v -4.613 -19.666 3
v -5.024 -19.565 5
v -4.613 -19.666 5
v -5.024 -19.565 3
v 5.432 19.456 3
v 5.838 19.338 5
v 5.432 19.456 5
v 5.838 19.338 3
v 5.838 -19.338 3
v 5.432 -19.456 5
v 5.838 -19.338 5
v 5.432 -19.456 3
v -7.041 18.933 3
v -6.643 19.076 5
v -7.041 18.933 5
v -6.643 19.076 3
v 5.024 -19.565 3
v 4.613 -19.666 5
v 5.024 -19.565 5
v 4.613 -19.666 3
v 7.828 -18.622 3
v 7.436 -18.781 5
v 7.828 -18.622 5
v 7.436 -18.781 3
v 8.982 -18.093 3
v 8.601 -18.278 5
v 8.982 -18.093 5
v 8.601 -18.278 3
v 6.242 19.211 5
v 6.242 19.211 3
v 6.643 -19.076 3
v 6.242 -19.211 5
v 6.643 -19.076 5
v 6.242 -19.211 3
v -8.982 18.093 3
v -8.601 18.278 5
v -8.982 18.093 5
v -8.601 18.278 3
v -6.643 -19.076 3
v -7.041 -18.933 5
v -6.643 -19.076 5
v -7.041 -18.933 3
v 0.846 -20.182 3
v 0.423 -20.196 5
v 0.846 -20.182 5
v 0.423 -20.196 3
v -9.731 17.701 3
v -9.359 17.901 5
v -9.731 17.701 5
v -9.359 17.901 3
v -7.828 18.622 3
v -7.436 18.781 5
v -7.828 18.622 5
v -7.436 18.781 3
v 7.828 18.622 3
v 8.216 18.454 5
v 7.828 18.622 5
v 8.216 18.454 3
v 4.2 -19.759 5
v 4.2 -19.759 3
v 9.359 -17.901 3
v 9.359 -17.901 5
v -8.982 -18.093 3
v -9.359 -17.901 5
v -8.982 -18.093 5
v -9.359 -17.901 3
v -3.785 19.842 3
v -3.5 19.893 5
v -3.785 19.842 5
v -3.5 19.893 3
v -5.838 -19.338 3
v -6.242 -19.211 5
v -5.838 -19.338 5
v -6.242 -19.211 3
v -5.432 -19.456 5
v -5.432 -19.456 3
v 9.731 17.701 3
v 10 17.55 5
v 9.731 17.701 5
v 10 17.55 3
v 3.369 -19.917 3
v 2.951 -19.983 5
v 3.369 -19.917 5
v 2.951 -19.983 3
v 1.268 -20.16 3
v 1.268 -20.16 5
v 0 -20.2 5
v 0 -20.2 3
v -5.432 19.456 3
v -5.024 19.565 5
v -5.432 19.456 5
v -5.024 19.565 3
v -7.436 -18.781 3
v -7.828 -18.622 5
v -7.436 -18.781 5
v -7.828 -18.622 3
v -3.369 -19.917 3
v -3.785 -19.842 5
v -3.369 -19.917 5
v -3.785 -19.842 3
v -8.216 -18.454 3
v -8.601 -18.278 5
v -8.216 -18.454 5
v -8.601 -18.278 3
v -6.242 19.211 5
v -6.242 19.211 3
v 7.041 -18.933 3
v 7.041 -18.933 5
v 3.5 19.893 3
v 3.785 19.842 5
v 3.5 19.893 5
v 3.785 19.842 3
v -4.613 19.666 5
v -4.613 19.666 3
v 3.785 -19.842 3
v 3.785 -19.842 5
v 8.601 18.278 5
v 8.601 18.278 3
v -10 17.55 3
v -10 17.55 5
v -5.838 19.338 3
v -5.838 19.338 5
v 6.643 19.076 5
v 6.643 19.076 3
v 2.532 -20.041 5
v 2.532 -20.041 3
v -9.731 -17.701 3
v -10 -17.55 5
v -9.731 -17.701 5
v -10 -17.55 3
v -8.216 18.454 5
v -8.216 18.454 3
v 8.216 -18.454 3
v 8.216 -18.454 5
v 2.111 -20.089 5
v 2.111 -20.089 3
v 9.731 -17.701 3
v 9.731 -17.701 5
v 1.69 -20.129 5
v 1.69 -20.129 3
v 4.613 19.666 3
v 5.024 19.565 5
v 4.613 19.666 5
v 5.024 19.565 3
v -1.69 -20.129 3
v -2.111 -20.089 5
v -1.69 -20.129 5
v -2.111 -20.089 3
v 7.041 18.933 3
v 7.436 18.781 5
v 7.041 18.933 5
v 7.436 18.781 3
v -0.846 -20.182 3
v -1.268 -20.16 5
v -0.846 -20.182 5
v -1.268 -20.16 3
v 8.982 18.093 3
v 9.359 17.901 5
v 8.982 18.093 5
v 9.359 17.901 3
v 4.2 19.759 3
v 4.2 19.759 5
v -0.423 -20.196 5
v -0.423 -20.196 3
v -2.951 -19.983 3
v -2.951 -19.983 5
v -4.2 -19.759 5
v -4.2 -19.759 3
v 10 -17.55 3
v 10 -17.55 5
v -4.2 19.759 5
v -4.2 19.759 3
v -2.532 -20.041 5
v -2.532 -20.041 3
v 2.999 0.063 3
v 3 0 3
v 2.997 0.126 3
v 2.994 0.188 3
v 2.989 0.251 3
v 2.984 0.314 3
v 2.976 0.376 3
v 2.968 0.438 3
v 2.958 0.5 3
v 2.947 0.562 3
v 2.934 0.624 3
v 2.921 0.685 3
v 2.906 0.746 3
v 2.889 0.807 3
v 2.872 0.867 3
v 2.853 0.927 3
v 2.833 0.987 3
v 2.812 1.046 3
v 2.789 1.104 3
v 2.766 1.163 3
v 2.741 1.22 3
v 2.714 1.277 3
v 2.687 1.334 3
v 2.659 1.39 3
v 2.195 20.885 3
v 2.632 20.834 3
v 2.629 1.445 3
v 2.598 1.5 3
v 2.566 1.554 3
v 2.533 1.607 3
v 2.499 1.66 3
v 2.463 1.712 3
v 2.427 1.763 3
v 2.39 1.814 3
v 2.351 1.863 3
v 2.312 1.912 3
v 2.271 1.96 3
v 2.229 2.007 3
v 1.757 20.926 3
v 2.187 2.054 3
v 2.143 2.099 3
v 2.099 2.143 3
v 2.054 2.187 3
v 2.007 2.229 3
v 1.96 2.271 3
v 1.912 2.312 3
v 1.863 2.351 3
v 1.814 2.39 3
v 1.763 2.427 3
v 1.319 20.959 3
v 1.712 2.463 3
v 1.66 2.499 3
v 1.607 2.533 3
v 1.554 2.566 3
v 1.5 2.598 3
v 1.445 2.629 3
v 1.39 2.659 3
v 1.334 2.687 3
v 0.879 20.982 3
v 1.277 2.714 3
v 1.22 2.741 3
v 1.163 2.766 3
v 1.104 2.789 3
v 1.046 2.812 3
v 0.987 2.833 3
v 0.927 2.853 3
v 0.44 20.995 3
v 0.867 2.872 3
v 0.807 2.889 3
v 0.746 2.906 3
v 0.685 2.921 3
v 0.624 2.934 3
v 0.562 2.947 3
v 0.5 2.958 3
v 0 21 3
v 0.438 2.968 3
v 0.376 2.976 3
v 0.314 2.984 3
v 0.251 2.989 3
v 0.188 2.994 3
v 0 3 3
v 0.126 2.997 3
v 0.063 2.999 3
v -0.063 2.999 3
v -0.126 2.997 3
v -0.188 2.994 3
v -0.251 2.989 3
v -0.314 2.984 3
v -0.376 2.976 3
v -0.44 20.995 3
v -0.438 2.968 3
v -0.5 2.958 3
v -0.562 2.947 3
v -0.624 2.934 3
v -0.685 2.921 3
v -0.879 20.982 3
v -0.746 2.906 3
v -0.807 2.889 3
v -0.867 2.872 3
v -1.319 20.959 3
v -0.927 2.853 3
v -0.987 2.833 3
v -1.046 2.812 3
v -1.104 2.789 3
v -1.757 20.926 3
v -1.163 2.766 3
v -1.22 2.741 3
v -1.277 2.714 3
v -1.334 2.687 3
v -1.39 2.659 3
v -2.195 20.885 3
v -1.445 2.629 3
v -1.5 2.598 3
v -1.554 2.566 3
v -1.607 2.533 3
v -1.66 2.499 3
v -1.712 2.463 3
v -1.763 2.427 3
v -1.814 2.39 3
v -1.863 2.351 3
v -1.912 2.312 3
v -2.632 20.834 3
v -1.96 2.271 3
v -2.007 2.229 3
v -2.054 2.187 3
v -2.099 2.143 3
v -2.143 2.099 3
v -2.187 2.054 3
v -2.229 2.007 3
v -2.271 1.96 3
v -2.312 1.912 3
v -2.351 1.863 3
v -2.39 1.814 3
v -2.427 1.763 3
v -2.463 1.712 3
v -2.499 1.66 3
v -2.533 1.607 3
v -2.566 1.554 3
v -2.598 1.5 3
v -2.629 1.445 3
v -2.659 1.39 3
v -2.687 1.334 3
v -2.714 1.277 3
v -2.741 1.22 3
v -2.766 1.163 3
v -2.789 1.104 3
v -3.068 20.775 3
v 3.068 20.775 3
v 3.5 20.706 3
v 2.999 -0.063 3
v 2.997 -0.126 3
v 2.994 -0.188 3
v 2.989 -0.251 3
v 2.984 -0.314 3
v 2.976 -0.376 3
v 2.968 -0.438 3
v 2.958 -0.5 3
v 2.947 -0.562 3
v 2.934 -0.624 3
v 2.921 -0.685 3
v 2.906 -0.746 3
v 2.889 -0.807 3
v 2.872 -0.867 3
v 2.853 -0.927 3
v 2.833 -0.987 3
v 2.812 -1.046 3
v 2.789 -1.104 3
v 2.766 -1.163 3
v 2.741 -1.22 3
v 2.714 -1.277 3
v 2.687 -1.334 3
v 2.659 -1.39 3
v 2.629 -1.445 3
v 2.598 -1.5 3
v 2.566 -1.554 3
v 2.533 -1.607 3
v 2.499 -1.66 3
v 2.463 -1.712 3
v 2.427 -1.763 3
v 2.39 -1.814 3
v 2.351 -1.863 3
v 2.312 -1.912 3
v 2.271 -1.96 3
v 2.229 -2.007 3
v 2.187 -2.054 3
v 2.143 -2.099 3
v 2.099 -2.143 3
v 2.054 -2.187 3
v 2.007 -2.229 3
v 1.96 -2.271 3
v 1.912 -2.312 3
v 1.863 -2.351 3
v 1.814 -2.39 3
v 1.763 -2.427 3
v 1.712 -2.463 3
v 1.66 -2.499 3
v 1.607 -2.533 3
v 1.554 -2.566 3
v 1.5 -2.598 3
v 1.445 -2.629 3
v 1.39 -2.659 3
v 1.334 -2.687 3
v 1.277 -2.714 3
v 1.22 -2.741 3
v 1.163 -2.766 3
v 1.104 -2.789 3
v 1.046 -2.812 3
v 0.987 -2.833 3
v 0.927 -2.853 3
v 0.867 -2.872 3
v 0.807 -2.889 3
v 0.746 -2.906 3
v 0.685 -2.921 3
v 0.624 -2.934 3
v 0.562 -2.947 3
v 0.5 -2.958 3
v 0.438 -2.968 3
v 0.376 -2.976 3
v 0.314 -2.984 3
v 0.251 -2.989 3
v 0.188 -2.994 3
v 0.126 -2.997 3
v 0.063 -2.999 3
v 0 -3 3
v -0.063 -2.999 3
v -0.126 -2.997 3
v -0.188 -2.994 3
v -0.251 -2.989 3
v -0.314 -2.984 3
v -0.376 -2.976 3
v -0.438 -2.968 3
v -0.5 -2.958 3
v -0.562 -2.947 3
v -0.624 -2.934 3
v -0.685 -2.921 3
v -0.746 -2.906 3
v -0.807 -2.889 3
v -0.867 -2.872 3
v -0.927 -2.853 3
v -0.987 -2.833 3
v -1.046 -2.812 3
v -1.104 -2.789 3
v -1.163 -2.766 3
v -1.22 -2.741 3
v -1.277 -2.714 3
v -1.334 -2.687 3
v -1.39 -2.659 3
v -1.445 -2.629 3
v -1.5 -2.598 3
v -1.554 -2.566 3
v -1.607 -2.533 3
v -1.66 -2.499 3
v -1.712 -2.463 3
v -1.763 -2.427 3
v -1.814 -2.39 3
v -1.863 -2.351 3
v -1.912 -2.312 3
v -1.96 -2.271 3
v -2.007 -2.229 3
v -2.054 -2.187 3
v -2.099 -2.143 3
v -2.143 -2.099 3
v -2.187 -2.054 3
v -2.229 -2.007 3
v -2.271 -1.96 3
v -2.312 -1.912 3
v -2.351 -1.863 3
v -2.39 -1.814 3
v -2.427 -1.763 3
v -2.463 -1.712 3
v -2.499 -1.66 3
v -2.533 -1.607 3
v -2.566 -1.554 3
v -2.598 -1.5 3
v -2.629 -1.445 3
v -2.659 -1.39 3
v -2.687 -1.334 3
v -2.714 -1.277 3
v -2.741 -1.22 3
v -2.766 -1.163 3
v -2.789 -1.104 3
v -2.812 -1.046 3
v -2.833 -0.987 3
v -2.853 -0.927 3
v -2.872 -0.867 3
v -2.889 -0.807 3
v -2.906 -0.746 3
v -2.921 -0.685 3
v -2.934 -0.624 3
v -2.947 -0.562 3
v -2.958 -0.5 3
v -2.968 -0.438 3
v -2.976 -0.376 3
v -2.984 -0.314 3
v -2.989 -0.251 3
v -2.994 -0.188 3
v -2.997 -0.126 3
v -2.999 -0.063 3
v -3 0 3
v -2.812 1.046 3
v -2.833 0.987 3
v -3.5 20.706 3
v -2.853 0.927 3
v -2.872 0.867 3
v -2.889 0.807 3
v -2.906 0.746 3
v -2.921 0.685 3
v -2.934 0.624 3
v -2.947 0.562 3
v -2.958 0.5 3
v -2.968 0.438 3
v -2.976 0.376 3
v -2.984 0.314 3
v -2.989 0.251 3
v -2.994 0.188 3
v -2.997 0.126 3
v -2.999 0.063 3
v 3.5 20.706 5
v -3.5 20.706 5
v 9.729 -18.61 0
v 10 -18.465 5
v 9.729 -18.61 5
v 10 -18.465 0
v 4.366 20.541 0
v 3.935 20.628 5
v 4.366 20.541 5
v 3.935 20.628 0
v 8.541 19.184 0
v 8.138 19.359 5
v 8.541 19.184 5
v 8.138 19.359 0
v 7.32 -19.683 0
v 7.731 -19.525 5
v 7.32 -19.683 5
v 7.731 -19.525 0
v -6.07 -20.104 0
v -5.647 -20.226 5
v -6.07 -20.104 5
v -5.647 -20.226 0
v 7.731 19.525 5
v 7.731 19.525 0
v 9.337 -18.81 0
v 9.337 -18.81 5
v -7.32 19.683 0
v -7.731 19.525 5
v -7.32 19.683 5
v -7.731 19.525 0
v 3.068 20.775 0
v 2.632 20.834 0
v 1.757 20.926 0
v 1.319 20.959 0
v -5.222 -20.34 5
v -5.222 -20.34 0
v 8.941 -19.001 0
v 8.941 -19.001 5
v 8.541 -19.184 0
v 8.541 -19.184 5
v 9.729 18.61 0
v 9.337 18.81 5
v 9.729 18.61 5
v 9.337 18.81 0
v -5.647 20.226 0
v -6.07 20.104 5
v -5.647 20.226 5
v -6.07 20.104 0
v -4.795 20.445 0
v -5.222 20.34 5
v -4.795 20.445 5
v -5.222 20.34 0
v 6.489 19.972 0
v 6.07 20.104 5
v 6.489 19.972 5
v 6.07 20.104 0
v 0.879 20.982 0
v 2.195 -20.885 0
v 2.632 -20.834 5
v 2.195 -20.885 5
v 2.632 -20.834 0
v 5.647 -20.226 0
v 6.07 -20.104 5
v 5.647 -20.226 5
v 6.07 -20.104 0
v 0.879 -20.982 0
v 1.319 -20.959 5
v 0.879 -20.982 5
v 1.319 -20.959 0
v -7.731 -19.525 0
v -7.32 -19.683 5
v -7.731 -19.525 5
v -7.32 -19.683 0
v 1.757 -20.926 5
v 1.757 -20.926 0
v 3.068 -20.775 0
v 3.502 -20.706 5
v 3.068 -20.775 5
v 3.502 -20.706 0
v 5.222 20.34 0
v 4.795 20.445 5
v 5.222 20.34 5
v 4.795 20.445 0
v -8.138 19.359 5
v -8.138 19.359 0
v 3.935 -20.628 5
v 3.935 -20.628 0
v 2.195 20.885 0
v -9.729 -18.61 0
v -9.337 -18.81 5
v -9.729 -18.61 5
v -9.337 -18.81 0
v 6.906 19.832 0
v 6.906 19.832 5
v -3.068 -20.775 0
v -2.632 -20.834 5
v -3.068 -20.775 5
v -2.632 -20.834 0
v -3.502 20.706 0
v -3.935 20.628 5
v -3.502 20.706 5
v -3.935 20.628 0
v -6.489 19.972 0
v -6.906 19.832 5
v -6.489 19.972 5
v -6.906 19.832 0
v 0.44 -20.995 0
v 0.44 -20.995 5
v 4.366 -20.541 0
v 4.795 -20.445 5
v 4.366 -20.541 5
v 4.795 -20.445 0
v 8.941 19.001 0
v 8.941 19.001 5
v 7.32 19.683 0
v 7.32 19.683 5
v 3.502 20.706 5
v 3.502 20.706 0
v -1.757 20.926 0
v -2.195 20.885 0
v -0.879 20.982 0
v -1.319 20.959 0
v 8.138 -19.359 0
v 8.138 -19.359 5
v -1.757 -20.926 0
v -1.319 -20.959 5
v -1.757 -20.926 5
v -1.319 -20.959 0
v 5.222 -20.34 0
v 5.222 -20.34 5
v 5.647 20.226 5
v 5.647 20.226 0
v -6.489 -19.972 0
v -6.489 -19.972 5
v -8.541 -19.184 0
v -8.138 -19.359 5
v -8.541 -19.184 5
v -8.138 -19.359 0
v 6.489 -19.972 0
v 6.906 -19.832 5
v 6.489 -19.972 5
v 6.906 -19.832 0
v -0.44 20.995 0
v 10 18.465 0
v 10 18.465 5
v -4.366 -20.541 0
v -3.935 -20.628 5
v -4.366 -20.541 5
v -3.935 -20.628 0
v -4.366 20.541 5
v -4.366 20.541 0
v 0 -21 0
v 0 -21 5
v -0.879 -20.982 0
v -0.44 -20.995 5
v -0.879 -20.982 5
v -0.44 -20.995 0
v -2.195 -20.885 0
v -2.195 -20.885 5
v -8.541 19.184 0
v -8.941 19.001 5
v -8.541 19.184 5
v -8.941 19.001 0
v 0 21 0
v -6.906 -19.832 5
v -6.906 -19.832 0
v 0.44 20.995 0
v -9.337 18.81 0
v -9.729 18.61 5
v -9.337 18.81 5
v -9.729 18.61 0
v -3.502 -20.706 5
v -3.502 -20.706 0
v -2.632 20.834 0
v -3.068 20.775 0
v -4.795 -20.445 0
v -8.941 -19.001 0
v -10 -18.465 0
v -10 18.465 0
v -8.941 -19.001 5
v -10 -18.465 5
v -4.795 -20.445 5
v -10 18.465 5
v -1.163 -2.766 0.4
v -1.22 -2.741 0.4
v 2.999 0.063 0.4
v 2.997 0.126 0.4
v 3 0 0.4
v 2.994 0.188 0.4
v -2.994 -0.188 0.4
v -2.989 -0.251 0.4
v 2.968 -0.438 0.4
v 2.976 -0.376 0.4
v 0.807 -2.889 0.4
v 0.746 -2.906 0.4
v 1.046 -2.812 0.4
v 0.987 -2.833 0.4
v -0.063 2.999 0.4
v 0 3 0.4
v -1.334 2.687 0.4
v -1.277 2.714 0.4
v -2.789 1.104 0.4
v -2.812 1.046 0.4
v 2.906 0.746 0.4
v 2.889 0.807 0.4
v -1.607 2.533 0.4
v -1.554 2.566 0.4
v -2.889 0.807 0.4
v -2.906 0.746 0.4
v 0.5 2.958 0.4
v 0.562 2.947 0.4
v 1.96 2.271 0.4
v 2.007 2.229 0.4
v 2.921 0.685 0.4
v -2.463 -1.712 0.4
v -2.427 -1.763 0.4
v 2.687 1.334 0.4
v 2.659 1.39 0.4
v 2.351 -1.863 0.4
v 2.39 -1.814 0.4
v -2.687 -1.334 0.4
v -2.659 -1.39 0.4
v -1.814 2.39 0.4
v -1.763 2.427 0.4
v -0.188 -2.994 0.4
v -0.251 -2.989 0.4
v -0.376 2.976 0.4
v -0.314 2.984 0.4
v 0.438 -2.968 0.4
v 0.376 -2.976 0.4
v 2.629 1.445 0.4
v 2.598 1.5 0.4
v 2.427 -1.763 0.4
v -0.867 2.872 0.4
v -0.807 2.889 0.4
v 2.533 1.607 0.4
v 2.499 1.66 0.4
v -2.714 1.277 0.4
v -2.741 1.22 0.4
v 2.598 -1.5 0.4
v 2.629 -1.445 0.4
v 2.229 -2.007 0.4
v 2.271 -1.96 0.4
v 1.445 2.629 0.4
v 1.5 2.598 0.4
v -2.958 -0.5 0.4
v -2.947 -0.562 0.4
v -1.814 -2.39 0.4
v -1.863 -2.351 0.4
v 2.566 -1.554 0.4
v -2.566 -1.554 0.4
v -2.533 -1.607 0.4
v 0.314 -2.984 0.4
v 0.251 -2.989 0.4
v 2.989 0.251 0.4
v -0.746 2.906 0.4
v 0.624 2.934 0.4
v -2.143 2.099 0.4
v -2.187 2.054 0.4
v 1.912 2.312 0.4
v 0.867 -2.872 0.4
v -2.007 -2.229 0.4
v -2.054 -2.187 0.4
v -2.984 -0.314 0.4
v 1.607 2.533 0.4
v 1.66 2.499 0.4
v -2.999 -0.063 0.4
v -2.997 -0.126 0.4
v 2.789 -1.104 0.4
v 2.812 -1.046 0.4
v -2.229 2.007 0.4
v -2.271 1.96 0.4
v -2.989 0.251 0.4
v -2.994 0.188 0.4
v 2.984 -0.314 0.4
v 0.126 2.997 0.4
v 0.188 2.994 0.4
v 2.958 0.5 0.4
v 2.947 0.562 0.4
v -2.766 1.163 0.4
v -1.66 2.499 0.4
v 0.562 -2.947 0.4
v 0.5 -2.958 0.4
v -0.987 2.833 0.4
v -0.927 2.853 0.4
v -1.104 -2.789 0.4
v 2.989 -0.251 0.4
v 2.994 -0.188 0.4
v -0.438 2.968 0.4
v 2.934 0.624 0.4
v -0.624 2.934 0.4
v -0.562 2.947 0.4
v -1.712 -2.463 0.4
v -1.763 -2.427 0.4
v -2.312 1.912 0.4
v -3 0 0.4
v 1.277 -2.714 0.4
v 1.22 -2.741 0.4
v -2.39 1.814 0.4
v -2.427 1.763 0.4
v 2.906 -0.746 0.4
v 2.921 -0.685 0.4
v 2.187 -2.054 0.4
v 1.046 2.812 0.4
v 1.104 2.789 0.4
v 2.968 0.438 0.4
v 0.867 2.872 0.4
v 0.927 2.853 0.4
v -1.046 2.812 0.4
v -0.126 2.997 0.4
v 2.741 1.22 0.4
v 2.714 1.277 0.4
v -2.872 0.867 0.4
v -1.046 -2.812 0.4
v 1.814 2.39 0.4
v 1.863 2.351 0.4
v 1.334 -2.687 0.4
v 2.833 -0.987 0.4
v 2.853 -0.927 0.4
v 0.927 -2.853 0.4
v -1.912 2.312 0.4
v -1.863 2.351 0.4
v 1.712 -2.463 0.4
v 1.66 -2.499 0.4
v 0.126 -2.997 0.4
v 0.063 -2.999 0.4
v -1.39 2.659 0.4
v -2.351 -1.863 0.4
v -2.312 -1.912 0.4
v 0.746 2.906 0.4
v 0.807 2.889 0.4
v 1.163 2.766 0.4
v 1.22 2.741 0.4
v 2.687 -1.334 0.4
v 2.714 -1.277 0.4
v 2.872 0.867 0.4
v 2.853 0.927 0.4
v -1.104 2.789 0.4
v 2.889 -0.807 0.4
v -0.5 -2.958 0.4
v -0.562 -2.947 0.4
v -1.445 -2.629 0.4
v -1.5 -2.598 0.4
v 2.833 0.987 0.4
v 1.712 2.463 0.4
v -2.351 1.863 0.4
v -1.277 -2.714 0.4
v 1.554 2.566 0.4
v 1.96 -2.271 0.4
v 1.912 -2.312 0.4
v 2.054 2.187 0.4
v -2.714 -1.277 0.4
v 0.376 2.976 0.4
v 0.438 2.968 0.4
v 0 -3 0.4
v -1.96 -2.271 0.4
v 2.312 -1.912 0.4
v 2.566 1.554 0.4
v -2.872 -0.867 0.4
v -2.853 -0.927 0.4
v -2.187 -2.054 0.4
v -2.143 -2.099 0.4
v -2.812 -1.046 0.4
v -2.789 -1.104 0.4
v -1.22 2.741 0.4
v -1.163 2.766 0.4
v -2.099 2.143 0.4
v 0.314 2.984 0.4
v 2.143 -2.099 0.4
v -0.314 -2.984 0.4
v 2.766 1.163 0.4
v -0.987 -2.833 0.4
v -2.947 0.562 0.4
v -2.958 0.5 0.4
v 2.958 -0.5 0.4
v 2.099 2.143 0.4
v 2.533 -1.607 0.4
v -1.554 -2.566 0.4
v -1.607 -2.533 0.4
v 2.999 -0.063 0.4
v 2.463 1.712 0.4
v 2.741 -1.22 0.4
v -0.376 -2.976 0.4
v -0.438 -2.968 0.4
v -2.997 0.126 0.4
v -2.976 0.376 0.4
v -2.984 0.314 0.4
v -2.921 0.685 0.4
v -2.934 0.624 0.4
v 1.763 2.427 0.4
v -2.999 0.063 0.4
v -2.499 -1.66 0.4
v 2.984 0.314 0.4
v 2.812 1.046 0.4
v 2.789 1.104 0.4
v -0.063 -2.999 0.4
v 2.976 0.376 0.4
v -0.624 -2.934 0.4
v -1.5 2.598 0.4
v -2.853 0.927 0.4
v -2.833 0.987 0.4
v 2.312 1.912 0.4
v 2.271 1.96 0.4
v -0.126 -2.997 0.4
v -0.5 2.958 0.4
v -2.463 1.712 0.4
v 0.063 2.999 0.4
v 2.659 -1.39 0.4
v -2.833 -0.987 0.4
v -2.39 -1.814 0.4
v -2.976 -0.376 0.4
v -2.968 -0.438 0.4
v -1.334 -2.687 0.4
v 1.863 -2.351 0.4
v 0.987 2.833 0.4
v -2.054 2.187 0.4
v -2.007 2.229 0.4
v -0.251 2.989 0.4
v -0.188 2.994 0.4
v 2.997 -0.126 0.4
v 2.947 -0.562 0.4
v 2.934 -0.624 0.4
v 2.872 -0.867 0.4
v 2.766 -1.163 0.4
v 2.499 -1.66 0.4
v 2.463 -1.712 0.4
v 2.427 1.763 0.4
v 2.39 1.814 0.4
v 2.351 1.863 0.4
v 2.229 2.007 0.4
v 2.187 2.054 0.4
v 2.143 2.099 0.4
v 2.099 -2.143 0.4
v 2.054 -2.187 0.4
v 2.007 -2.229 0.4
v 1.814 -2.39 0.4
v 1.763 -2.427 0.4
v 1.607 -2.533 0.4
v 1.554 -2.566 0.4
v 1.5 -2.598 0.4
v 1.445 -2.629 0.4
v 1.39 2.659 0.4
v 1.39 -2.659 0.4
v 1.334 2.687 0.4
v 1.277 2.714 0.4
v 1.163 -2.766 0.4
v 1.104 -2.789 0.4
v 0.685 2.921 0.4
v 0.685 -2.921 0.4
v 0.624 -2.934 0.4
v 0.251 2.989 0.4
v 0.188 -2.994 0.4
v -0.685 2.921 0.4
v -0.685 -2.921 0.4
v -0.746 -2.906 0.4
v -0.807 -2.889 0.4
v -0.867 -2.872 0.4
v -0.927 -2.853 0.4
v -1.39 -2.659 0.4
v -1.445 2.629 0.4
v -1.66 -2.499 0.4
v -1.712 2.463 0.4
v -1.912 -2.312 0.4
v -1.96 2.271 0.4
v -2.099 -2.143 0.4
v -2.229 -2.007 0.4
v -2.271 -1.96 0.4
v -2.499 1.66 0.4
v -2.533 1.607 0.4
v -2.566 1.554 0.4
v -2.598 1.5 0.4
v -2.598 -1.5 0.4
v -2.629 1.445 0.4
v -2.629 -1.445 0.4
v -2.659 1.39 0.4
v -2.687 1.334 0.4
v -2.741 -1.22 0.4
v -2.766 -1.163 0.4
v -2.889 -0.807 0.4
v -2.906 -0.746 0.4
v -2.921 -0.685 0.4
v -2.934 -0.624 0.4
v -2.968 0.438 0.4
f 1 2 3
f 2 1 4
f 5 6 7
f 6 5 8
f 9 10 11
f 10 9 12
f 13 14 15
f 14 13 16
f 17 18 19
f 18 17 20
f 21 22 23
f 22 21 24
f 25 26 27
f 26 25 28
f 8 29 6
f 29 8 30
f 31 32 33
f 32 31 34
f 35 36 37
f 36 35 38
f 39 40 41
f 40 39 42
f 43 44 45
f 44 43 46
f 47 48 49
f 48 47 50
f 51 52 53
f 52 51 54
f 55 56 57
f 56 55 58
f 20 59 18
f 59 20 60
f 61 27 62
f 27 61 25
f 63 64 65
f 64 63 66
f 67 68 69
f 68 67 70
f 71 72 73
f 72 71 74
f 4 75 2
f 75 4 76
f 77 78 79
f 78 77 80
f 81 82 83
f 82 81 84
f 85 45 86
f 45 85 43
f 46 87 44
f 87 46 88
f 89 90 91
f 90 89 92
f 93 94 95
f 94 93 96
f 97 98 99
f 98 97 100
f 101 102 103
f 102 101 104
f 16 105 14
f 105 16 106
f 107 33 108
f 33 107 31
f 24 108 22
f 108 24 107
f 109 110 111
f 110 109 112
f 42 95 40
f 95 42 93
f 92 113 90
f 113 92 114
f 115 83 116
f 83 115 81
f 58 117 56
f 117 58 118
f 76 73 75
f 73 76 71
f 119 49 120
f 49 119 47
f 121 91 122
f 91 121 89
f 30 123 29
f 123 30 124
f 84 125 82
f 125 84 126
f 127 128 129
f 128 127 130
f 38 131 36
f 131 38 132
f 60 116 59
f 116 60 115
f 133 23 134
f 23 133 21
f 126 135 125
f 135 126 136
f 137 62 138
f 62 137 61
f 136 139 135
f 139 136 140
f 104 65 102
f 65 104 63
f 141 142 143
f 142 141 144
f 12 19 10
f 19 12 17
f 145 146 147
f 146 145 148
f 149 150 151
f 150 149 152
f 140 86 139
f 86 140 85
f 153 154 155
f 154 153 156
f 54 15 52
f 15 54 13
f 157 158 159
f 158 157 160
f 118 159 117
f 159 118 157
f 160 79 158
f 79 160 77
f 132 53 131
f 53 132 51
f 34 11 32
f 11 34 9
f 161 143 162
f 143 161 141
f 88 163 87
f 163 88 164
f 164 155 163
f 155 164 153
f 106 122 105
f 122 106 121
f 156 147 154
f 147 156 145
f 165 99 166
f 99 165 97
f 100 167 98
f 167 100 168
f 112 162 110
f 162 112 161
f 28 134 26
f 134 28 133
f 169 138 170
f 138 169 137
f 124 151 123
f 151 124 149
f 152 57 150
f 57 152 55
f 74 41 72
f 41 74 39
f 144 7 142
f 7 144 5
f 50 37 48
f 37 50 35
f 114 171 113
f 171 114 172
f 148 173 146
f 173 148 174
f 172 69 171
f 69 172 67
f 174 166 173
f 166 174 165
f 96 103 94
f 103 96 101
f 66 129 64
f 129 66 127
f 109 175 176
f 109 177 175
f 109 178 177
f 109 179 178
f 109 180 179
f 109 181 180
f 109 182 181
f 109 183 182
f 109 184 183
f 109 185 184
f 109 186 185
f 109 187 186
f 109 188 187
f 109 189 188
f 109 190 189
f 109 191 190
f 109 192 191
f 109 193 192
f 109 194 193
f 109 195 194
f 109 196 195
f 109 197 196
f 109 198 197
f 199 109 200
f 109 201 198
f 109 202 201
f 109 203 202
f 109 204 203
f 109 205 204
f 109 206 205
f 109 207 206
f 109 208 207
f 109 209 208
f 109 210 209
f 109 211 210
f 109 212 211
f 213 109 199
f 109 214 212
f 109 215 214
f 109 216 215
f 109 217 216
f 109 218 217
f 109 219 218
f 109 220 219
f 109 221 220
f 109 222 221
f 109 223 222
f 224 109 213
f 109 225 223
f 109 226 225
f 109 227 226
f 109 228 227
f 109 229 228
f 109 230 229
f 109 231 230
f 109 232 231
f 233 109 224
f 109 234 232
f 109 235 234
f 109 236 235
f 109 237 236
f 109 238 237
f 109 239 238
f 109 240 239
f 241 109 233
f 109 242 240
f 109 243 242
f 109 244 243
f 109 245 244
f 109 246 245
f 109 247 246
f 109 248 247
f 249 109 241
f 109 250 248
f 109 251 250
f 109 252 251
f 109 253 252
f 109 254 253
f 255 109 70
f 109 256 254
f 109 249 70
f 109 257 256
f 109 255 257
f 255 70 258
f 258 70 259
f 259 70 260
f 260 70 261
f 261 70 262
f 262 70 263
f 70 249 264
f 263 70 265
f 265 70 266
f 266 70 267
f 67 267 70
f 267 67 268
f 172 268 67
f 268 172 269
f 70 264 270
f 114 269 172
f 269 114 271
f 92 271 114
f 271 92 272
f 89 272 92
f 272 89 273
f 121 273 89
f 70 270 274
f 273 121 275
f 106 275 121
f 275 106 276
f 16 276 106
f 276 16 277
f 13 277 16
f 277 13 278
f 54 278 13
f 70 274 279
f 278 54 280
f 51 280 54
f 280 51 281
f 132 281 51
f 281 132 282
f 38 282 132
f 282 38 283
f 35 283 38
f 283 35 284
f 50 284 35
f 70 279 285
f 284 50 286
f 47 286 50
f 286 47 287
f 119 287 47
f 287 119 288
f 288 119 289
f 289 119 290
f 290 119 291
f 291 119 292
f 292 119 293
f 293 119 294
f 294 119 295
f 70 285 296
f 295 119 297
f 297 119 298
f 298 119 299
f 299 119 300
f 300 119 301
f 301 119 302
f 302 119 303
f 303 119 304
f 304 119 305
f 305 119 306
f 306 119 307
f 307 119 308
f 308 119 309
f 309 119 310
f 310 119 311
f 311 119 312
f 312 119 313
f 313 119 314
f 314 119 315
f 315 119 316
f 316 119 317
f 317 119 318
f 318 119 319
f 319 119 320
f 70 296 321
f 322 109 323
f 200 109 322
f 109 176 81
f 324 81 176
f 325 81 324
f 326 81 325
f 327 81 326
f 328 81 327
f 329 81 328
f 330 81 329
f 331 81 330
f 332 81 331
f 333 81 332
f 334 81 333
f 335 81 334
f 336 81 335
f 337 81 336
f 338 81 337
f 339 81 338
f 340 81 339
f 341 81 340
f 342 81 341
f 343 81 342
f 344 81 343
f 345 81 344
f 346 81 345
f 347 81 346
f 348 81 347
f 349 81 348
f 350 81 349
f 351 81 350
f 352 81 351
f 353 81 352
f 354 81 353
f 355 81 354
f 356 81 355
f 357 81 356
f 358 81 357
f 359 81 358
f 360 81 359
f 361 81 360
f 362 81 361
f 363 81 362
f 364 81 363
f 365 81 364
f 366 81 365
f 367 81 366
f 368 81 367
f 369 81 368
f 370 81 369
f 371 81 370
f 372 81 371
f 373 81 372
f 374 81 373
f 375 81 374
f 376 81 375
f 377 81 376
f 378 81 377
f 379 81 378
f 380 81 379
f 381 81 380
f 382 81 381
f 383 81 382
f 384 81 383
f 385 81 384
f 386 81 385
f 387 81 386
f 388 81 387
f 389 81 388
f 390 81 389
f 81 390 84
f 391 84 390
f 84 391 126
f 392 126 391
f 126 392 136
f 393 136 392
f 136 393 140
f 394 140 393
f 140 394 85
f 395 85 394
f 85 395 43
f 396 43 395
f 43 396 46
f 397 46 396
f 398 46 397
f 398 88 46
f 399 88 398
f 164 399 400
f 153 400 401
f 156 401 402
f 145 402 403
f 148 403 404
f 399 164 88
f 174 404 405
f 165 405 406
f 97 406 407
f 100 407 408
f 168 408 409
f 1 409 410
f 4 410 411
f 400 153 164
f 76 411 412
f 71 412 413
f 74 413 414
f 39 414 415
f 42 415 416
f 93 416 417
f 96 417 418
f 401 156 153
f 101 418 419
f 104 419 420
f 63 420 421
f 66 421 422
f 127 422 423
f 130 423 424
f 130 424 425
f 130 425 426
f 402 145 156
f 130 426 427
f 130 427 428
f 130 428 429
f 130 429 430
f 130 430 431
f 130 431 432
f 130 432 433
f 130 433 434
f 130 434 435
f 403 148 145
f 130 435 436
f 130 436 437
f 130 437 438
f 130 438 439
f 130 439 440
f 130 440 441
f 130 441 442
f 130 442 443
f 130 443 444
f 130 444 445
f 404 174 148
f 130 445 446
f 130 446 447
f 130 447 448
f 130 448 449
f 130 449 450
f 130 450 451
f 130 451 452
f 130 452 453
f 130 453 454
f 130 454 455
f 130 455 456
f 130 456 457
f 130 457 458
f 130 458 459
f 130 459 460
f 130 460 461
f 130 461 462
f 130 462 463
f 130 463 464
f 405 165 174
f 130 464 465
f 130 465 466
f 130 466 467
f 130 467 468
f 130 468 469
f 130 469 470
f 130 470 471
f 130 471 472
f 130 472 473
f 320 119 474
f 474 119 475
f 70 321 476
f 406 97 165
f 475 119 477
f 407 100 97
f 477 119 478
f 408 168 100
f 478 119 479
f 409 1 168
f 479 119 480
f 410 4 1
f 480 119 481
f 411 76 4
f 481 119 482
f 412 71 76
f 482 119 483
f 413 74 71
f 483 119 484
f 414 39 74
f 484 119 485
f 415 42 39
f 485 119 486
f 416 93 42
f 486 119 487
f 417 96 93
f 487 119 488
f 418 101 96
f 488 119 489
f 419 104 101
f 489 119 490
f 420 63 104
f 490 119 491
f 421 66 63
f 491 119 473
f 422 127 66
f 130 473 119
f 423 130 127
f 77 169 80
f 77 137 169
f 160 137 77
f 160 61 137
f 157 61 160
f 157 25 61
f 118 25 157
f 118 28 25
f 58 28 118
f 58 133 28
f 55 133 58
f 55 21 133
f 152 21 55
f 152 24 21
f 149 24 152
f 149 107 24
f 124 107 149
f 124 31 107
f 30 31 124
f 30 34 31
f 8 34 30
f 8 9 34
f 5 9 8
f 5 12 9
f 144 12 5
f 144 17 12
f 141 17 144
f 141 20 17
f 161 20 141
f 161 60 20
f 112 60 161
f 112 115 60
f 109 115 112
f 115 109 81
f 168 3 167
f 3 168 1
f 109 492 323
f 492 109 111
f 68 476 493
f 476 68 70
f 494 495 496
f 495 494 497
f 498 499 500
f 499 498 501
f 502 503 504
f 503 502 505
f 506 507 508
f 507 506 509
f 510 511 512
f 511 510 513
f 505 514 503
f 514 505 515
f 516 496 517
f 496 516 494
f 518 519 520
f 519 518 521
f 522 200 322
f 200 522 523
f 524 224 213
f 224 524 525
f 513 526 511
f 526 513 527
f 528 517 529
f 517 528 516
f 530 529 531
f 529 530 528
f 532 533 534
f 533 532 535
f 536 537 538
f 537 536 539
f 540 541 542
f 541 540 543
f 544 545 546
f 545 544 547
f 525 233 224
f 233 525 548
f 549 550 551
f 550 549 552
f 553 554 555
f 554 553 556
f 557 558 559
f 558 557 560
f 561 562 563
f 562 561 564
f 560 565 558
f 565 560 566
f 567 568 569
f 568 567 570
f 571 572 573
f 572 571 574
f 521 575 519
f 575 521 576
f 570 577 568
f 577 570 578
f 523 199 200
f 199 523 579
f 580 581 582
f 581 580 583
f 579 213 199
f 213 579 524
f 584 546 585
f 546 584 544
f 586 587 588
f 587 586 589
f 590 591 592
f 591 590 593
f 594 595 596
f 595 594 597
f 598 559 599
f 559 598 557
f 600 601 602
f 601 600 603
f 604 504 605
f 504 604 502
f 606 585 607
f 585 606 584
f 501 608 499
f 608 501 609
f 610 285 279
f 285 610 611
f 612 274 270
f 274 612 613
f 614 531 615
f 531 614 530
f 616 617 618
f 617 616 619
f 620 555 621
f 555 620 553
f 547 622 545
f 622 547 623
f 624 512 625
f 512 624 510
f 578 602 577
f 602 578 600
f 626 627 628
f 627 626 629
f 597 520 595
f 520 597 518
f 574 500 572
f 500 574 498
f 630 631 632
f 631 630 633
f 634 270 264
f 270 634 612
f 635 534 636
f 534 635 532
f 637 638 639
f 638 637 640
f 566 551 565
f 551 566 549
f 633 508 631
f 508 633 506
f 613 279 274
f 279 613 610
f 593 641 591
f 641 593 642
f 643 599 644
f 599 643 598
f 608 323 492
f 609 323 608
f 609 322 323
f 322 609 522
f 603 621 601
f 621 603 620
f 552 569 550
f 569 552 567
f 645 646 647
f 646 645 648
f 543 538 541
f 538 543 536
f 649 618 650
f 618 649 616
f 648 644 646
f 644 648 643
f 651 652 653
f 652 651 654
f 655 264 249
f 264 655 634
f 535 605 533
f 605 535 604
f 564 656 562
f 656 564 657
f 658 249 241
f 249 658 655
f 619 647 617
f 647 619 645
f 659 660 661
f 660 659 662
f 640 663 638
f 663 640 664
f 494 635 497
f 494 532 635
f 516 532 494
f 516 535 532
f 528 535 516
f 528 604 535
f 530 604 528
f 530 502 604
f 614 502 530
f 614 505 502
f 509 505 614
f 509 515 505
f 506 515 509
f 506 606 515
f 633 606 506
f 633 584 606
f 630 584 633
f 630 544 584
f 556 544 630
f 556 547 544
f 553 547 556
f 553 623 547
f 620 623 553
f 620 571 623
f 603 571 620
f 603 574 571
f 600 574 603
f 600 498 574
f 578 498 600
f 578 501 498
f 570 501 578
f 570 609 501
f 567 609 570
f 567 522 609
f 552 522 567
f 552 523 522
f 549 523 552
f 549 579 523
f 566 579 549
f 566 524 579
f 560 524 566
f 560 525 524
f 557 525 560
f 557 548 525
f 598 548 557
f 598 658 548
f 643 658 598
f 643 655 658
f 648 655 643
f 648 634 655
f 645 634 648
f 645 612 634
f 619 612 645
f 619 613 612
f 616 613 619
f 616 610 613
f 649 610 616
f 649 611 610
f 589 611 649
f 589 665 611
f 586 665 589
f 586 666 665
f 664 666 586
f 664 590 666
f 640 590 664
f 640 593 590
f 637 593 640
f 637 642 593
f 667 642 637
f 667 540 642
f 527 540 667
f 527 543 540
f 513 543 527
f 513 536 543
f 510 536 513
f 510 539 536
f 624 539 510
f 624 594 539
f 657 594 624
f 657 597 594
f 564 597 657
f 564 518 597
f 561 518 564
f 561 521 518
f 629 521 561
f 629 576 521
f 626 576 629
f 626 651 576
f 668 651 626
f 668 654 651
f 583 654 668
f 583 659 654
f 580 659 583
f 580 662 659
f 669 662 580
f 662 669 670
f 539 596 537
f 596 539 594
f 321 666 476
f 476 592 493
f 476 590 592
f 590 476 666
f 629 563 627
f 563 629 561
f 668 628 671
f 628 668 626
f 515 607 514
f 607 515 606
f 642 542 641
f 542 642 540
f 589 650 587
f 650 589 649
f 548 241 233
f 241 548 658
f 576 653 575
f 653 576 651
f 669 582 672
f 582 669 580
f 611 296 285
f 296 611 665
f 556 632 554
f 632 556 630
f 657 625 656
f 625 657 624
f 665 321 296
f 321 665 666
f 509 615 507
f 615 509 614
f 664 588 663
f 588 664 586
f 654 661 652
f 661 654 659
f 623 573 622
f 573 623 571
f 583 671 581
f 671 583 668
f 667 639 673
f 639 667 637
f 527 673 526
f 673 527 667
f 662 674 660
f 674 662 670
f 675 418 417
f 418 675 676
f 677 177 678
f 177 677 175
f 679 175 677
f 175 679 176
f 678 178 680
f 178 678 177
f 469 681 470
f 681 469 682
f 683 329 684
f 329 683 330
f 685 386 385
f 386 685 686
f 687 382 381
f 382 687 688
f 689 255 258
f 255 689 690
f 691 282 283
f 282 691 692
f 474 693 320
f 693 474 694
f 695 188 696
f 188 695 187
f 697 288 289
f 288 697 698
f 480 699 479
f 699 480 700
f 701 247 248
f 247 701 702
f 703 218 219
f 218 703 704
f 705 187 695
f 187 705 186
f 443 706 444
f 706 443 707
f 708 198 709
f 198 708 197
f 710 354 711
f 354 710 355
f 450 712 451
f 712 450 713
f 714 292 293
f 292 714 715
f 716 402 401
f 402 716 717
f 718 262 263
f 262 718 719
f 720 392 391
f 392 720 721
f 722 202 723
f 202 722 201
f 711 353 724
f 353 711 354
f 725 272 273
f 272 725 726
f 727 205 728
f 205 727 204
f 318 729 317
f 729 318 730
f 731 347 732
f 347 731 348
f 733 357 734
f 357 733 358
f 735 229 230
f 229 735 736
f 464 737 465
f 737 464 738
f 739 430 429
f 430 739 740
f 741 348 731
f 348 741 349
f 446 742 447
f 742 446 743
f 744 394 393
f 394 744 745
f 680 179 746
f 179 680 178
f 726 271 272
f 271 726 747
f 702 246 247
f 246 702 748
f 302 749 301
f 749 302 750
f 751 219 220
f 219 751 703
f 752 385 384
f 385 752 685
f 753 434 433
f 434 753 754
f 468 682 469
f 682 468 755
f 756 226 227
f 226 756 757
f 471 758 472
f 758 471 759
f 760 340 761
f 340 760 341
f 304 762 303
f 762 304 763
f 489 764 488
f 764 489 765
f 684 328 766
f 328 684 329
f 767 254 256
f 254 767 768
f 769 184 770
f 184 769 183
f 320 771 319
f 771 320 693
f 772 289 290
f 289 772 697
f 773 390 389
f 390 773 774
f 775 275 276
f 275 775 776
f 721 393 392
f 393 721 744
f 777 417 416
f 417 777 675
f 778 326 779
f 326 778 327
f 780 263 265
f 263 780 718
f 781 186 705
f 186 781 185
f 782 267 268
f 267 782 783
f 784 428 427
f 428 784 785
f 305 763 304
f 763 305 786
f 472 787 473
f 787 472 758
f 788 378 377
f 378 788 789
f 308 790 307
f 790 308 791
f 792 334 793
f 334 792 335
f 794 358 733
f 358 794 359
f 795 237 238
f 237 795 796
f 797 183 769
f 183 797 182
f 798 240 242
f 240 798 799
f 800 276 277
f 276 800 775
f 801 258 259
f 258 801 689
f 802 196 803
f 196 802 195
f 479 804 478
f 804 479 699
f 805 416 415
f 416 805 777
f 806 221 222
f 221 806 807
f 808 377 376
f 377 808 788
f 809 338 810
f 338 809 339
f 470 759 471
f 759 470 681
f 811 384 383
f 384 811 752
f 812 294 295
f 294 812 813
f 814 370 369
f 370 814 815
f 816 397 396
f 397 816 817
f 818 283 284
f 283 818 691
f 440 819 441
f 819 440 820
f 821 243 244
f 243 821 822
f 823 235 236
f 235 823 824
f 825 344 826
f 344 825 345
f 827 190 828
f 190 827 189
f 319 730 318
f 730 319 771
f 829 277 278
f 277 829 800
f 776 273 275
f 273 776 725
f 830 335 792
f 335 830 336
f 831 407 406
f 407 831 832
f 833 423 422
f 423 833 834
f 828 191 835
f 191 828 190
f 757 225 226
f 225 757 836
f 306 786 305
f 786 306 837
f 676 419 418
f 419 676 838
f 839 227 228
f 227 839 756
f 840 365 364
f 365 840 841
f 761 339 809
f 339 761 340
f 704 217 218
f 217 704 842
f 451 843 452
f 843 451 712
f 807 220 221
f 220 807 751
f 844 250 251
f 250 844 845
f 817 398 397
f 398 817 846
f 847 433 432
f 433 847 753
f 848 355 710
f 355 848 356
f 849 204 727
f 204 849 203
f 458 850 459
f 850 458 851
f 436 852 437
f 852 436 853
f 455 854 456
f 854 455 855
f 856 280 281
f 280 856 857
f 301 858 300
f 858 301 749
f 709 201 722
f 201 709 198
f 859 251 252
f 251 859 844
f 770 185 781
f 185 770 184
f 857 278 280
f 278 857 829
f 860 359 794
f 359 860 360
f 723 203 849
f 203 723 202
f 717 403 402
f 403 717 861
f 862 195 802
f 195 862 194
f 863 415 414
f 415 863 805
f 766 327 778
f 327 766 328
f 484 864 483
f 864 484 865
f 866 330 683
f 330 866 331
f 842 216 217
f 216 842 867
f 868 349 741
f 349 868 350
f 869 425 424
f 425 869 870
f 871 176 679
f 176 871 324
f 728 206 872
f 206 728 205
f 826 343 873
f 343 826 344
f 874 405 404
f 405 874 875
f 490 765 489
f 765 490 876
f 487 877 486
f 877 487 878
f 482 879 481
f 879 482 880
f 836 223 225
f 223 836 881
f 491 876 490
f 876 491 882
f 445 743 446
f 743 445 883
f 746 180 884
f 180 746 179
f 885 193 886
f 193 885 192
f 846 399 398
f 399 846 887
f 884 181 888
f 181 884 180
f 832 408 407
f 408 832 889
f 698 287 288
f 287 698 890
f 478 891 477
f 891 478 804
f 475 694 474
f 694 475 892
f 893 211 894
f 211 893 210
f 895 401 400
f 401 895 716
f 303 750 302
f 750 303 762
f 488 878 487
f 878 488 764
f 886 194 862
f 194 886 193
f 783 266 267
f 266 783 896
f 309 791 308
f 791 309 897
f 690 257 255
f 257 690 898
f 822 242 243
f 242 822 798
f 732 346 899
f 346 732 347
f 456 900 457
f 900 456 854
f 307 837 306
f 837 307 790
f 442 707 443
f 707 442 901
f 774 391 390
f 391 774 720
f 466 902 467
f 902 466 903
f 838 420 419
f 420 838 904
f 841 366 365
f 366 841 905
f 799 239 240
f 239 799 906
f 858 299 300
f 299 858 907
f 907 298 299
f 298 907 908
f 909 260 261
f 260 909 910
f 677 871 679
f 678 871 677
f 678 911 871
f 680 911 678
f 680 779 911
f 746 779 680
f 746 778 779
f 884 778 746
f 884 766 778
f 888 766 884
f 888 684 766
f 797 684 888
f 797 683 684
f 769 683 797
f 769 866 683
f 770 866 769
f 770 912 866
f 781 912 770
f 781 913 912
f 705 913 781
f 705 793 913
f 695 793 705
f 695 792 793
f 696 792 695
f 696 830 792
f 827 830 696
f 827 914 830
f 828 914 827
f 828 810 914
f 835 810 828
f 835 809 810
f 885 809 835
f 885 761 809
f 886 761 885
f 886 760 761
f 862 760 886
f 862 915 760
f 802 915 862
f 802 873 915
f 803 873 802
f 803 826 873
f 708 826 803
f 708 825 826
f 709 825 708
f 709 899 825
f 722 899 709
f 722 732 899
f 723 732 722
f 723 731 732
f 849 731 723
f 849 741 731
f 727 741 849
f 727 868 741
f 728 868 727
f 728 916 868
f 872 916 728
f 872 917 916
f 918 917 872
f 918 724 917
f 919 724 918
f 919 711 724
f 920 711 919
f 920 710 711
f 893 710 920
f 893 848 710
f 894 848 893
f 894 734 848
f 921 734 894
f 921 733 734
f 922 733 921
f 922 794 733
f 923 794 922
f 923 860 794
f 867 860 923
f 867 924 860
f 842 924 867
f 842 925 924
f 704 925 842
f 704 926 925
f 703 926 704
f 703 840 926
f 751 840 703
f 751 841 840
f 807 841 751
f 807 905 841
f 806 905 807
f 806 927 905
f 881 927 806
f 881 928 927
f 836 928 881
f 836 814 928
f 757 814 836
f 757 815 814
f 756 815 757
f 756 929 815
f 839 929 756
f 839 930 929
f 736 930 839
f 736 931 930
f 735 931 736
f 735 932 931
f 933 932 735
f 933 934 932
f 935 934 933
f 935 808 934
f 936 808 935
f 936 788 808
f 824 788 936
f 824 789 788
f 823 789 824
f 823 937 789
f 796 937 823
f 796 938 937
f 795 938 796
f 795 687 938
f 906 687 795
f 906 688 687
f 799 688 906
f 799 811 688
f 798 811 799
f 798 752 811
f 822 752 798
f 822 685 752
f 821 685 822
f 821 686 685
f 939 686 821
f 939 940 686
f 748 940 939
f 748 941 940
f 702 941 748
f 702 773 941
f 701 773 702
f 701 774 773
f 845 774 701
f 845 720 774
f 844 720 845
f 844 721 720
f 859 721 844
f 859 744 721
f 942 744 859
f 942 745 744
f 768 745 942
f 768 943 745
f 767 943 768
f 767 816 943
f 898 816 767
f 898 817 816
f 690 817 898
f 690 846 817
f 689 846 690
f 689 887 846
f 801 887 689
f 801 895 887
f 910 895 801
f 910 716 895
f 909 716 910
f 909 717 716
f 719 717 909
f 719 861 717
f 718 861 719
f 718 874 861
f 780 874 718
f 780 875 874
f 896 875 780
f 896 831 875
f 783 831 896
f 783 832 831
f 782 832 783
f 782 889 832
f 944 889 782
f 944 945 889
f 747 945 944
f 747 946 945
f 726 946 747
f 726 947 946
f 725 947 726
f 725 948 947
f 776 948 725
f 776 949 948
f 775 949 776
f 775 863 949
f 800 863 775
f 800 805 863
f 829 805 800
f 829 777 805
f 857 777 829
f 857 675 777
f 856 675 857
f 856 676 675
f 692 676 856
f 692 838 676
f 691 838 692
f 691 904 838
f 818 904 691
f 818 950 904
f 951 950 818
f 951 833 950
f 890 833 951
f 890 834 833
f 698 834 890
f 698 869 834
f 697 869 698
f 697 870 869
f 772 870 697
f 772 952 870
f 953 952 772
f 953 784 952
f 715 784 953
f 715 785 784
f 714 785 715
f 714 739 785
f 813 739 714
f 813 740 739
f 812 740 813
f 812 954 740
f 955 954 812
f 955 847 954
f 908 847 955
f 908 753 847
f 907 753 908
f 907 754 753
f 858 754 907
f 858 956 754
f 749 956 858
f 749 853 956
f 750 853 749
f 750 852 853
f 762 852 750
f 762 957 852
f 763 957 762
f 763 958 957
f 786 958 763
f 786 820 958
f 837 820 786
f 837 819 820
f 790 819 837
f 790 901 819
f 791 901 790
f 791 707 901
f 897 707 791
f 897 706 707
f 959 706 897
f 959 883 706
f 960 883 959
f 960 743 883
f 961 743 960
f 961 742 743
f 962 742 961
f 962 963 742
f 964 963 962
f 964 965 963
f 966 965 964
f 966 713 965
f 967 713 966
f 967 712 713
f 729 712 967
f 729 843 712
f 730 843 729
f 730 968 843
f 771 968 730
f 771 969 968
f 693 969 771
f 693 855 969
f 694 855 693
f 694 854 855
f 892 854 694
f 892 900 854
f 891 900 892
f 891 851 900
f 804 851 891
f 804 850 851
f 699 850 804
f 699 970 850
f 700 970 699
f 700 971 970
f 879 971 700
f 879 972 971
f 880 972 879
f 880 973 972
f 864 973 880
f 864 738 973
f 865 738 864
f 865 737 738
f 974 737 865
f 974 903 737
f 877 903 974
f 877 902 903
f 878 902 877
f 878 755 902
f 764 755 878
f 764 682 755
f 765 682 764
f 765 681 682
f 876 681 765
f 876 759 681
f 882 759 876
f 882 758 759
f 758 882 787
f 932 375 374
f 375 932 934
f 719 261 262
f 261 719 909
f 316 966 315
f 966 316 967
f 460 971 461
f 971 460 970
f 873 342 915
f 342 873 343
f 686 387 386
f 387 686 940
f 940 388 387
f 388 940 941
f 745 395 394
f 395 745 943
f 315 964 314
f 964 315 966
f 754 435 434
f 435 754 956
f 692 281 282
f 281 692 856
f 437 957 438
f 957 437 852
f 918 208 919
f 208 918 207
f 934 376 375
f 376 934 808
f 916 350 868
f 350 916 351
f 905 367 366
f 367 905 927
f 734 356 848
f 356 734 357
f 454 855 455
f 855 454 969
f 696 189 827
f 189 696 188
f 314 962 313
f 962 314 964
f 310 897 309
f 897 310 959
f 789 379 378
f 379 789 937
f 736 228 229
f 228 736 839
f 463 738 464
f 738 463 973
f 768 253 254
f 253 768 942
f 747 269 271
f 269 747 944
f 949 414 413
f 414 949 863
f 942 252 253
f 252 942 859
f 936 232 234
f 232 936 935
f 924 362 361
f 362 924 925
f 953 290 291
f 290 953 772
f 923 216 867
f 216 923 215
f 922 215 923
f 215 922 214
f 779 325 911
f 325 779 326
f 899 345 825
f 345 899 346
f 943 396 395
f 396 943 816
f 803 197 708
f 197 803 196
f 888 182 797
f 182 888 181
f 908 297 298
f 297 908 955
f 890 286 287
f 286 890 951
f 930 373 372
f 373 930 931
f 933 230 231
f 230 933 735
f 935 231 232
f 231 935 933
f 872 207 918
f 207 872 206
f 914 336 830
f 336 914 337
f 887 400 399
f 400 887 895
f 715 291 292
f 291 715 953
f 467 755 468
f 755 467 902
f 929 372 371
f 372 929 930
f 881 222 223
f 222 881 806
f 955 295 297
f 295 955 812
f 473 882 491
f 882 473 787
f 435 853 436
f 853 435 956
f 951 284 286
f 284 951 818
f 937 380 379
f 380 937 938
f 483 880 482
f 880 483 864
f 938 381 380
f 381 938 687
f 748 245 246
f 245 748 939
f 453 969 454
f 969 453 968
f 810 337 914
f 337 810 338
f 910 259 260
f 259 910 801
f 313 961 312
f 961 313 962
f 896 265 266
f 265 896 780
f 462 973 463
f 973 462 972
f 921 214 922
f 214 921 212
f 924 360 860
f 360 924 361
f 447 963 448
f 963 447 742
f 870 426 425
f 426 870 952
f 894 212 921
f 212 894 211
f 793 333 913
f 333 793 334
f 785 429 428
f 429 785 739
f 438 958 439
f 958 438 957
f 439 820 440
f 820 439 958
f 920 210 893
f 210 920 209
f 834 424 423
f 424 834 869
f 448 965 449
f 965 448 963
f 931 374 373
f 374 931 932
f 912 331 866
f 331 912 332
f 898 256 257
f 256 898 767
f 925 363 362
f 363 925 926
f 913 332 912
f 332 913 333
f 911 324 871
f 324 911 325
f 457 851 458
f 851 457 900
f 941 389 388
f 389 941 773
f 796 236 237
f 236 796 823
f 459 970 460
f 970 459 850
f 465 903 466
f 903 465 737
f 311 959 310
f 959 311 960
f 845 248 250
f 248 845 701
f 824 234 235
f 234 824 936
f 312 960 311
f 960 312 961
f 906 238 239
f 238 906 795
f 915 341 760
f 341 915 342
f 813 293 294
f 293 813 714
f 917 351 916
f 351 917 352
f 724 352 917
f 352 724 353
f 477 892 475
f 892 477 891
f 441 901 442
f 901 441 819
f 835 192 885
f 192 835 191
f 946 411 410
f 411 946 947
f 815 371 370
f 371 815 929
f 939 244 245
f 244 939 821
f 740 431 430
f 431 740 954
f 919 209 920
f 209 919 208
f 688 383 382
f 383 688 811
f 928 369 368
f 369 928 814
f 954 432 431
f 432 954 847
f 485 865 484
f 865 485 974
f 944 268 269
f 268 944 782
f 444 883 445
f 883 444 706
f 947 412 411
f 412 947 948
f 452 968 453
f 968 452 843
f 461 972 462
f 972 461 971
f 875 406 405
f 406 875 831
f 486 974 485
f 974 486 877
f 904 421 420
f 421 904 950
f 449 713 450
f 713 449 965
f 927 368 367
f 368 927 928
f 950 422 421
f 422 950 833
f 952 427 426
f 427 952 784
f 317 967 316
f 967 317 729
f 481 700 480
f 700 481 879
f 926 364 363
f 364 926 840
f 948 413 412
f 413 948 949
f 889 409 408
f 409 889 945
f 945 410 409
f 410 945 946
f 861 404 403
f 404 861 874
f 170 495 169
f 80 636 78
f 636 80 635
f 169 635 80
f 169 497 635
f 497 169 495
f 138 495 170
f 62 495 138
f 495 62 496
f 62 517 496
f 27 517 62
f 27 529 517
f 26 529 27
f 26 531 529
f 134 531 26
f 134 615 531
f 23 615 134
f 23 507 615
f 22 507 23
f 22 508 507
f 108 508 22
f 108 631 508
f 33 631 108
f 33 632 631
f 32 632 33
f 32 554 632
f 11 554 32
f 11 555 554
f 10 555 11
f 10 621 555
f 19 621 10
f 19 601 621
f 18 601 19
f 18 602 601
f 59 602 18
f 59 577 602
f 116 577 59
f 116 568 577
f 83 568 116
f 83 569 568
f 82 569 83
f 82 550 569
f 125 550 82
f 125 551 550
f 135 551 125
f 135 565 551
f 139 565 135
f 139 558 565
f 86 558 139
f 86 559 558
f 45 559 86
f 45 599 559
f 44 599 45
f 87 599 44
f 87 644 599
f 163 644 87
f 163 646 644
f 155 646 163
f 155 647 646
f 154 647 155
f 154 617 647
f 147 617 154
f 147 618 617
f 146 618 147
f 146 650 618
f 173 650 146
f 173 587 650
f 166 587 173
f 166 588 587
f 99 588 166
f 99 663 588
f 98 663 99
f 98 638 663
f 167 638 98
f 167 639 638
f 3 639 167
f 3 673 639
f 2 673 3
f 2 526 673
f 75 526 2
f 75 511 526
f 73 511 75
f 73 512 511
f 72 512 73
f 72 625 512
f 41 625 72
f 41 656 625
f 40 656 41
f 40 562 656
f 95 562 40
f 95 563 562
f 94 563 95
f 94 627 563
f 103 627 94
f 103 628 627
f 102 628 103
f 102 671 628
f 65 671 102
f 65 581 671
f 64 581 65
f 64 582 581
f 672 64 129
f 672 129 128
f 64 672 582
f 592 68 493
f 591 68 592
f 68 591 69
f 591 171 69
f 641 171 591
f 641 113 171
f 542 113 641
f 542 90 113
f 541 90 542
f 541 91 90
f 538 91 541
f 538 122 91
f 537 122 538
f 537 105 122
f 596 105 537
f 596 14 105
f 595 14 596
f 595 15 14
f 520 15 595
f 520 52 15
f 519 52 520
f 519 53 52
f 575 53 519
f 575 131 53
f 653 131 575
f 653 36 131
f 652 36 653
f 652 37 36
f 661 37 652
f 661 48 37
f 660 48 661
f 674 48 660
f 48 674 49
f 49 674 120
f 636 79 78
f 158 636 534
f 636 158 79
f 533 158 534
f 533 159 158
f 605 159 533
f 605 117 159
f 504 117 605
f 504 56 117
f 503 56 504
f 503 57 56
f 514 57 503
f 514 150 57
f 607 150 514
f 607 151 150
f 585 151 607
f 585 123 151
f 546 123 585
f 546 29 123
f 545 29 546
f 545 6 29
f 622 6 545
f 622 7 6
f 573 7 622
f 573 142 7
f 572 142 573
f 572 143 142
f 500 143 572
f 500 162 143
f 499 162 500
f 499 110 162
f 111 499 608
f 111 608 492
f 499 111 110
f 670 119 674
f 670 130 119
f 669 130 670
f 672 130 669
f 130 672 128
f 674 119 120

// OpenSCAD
// magnets are 6mm x 3mm
// tracker disc is 40mm

intersection() {
  cube([20,50,10],true);
  difference() {
    cylinder(h=6,d=42,$fn=300);
    translate([0,0,0.4]) cylinder(h=2.6,d=6,$fn=300);
    translate([0,0,3]) {
        cylinder(h=5,d=40.4,$fn=300);
        translate([0,20,1.5]) cube([7,20,3],true);
    }
  }
}
